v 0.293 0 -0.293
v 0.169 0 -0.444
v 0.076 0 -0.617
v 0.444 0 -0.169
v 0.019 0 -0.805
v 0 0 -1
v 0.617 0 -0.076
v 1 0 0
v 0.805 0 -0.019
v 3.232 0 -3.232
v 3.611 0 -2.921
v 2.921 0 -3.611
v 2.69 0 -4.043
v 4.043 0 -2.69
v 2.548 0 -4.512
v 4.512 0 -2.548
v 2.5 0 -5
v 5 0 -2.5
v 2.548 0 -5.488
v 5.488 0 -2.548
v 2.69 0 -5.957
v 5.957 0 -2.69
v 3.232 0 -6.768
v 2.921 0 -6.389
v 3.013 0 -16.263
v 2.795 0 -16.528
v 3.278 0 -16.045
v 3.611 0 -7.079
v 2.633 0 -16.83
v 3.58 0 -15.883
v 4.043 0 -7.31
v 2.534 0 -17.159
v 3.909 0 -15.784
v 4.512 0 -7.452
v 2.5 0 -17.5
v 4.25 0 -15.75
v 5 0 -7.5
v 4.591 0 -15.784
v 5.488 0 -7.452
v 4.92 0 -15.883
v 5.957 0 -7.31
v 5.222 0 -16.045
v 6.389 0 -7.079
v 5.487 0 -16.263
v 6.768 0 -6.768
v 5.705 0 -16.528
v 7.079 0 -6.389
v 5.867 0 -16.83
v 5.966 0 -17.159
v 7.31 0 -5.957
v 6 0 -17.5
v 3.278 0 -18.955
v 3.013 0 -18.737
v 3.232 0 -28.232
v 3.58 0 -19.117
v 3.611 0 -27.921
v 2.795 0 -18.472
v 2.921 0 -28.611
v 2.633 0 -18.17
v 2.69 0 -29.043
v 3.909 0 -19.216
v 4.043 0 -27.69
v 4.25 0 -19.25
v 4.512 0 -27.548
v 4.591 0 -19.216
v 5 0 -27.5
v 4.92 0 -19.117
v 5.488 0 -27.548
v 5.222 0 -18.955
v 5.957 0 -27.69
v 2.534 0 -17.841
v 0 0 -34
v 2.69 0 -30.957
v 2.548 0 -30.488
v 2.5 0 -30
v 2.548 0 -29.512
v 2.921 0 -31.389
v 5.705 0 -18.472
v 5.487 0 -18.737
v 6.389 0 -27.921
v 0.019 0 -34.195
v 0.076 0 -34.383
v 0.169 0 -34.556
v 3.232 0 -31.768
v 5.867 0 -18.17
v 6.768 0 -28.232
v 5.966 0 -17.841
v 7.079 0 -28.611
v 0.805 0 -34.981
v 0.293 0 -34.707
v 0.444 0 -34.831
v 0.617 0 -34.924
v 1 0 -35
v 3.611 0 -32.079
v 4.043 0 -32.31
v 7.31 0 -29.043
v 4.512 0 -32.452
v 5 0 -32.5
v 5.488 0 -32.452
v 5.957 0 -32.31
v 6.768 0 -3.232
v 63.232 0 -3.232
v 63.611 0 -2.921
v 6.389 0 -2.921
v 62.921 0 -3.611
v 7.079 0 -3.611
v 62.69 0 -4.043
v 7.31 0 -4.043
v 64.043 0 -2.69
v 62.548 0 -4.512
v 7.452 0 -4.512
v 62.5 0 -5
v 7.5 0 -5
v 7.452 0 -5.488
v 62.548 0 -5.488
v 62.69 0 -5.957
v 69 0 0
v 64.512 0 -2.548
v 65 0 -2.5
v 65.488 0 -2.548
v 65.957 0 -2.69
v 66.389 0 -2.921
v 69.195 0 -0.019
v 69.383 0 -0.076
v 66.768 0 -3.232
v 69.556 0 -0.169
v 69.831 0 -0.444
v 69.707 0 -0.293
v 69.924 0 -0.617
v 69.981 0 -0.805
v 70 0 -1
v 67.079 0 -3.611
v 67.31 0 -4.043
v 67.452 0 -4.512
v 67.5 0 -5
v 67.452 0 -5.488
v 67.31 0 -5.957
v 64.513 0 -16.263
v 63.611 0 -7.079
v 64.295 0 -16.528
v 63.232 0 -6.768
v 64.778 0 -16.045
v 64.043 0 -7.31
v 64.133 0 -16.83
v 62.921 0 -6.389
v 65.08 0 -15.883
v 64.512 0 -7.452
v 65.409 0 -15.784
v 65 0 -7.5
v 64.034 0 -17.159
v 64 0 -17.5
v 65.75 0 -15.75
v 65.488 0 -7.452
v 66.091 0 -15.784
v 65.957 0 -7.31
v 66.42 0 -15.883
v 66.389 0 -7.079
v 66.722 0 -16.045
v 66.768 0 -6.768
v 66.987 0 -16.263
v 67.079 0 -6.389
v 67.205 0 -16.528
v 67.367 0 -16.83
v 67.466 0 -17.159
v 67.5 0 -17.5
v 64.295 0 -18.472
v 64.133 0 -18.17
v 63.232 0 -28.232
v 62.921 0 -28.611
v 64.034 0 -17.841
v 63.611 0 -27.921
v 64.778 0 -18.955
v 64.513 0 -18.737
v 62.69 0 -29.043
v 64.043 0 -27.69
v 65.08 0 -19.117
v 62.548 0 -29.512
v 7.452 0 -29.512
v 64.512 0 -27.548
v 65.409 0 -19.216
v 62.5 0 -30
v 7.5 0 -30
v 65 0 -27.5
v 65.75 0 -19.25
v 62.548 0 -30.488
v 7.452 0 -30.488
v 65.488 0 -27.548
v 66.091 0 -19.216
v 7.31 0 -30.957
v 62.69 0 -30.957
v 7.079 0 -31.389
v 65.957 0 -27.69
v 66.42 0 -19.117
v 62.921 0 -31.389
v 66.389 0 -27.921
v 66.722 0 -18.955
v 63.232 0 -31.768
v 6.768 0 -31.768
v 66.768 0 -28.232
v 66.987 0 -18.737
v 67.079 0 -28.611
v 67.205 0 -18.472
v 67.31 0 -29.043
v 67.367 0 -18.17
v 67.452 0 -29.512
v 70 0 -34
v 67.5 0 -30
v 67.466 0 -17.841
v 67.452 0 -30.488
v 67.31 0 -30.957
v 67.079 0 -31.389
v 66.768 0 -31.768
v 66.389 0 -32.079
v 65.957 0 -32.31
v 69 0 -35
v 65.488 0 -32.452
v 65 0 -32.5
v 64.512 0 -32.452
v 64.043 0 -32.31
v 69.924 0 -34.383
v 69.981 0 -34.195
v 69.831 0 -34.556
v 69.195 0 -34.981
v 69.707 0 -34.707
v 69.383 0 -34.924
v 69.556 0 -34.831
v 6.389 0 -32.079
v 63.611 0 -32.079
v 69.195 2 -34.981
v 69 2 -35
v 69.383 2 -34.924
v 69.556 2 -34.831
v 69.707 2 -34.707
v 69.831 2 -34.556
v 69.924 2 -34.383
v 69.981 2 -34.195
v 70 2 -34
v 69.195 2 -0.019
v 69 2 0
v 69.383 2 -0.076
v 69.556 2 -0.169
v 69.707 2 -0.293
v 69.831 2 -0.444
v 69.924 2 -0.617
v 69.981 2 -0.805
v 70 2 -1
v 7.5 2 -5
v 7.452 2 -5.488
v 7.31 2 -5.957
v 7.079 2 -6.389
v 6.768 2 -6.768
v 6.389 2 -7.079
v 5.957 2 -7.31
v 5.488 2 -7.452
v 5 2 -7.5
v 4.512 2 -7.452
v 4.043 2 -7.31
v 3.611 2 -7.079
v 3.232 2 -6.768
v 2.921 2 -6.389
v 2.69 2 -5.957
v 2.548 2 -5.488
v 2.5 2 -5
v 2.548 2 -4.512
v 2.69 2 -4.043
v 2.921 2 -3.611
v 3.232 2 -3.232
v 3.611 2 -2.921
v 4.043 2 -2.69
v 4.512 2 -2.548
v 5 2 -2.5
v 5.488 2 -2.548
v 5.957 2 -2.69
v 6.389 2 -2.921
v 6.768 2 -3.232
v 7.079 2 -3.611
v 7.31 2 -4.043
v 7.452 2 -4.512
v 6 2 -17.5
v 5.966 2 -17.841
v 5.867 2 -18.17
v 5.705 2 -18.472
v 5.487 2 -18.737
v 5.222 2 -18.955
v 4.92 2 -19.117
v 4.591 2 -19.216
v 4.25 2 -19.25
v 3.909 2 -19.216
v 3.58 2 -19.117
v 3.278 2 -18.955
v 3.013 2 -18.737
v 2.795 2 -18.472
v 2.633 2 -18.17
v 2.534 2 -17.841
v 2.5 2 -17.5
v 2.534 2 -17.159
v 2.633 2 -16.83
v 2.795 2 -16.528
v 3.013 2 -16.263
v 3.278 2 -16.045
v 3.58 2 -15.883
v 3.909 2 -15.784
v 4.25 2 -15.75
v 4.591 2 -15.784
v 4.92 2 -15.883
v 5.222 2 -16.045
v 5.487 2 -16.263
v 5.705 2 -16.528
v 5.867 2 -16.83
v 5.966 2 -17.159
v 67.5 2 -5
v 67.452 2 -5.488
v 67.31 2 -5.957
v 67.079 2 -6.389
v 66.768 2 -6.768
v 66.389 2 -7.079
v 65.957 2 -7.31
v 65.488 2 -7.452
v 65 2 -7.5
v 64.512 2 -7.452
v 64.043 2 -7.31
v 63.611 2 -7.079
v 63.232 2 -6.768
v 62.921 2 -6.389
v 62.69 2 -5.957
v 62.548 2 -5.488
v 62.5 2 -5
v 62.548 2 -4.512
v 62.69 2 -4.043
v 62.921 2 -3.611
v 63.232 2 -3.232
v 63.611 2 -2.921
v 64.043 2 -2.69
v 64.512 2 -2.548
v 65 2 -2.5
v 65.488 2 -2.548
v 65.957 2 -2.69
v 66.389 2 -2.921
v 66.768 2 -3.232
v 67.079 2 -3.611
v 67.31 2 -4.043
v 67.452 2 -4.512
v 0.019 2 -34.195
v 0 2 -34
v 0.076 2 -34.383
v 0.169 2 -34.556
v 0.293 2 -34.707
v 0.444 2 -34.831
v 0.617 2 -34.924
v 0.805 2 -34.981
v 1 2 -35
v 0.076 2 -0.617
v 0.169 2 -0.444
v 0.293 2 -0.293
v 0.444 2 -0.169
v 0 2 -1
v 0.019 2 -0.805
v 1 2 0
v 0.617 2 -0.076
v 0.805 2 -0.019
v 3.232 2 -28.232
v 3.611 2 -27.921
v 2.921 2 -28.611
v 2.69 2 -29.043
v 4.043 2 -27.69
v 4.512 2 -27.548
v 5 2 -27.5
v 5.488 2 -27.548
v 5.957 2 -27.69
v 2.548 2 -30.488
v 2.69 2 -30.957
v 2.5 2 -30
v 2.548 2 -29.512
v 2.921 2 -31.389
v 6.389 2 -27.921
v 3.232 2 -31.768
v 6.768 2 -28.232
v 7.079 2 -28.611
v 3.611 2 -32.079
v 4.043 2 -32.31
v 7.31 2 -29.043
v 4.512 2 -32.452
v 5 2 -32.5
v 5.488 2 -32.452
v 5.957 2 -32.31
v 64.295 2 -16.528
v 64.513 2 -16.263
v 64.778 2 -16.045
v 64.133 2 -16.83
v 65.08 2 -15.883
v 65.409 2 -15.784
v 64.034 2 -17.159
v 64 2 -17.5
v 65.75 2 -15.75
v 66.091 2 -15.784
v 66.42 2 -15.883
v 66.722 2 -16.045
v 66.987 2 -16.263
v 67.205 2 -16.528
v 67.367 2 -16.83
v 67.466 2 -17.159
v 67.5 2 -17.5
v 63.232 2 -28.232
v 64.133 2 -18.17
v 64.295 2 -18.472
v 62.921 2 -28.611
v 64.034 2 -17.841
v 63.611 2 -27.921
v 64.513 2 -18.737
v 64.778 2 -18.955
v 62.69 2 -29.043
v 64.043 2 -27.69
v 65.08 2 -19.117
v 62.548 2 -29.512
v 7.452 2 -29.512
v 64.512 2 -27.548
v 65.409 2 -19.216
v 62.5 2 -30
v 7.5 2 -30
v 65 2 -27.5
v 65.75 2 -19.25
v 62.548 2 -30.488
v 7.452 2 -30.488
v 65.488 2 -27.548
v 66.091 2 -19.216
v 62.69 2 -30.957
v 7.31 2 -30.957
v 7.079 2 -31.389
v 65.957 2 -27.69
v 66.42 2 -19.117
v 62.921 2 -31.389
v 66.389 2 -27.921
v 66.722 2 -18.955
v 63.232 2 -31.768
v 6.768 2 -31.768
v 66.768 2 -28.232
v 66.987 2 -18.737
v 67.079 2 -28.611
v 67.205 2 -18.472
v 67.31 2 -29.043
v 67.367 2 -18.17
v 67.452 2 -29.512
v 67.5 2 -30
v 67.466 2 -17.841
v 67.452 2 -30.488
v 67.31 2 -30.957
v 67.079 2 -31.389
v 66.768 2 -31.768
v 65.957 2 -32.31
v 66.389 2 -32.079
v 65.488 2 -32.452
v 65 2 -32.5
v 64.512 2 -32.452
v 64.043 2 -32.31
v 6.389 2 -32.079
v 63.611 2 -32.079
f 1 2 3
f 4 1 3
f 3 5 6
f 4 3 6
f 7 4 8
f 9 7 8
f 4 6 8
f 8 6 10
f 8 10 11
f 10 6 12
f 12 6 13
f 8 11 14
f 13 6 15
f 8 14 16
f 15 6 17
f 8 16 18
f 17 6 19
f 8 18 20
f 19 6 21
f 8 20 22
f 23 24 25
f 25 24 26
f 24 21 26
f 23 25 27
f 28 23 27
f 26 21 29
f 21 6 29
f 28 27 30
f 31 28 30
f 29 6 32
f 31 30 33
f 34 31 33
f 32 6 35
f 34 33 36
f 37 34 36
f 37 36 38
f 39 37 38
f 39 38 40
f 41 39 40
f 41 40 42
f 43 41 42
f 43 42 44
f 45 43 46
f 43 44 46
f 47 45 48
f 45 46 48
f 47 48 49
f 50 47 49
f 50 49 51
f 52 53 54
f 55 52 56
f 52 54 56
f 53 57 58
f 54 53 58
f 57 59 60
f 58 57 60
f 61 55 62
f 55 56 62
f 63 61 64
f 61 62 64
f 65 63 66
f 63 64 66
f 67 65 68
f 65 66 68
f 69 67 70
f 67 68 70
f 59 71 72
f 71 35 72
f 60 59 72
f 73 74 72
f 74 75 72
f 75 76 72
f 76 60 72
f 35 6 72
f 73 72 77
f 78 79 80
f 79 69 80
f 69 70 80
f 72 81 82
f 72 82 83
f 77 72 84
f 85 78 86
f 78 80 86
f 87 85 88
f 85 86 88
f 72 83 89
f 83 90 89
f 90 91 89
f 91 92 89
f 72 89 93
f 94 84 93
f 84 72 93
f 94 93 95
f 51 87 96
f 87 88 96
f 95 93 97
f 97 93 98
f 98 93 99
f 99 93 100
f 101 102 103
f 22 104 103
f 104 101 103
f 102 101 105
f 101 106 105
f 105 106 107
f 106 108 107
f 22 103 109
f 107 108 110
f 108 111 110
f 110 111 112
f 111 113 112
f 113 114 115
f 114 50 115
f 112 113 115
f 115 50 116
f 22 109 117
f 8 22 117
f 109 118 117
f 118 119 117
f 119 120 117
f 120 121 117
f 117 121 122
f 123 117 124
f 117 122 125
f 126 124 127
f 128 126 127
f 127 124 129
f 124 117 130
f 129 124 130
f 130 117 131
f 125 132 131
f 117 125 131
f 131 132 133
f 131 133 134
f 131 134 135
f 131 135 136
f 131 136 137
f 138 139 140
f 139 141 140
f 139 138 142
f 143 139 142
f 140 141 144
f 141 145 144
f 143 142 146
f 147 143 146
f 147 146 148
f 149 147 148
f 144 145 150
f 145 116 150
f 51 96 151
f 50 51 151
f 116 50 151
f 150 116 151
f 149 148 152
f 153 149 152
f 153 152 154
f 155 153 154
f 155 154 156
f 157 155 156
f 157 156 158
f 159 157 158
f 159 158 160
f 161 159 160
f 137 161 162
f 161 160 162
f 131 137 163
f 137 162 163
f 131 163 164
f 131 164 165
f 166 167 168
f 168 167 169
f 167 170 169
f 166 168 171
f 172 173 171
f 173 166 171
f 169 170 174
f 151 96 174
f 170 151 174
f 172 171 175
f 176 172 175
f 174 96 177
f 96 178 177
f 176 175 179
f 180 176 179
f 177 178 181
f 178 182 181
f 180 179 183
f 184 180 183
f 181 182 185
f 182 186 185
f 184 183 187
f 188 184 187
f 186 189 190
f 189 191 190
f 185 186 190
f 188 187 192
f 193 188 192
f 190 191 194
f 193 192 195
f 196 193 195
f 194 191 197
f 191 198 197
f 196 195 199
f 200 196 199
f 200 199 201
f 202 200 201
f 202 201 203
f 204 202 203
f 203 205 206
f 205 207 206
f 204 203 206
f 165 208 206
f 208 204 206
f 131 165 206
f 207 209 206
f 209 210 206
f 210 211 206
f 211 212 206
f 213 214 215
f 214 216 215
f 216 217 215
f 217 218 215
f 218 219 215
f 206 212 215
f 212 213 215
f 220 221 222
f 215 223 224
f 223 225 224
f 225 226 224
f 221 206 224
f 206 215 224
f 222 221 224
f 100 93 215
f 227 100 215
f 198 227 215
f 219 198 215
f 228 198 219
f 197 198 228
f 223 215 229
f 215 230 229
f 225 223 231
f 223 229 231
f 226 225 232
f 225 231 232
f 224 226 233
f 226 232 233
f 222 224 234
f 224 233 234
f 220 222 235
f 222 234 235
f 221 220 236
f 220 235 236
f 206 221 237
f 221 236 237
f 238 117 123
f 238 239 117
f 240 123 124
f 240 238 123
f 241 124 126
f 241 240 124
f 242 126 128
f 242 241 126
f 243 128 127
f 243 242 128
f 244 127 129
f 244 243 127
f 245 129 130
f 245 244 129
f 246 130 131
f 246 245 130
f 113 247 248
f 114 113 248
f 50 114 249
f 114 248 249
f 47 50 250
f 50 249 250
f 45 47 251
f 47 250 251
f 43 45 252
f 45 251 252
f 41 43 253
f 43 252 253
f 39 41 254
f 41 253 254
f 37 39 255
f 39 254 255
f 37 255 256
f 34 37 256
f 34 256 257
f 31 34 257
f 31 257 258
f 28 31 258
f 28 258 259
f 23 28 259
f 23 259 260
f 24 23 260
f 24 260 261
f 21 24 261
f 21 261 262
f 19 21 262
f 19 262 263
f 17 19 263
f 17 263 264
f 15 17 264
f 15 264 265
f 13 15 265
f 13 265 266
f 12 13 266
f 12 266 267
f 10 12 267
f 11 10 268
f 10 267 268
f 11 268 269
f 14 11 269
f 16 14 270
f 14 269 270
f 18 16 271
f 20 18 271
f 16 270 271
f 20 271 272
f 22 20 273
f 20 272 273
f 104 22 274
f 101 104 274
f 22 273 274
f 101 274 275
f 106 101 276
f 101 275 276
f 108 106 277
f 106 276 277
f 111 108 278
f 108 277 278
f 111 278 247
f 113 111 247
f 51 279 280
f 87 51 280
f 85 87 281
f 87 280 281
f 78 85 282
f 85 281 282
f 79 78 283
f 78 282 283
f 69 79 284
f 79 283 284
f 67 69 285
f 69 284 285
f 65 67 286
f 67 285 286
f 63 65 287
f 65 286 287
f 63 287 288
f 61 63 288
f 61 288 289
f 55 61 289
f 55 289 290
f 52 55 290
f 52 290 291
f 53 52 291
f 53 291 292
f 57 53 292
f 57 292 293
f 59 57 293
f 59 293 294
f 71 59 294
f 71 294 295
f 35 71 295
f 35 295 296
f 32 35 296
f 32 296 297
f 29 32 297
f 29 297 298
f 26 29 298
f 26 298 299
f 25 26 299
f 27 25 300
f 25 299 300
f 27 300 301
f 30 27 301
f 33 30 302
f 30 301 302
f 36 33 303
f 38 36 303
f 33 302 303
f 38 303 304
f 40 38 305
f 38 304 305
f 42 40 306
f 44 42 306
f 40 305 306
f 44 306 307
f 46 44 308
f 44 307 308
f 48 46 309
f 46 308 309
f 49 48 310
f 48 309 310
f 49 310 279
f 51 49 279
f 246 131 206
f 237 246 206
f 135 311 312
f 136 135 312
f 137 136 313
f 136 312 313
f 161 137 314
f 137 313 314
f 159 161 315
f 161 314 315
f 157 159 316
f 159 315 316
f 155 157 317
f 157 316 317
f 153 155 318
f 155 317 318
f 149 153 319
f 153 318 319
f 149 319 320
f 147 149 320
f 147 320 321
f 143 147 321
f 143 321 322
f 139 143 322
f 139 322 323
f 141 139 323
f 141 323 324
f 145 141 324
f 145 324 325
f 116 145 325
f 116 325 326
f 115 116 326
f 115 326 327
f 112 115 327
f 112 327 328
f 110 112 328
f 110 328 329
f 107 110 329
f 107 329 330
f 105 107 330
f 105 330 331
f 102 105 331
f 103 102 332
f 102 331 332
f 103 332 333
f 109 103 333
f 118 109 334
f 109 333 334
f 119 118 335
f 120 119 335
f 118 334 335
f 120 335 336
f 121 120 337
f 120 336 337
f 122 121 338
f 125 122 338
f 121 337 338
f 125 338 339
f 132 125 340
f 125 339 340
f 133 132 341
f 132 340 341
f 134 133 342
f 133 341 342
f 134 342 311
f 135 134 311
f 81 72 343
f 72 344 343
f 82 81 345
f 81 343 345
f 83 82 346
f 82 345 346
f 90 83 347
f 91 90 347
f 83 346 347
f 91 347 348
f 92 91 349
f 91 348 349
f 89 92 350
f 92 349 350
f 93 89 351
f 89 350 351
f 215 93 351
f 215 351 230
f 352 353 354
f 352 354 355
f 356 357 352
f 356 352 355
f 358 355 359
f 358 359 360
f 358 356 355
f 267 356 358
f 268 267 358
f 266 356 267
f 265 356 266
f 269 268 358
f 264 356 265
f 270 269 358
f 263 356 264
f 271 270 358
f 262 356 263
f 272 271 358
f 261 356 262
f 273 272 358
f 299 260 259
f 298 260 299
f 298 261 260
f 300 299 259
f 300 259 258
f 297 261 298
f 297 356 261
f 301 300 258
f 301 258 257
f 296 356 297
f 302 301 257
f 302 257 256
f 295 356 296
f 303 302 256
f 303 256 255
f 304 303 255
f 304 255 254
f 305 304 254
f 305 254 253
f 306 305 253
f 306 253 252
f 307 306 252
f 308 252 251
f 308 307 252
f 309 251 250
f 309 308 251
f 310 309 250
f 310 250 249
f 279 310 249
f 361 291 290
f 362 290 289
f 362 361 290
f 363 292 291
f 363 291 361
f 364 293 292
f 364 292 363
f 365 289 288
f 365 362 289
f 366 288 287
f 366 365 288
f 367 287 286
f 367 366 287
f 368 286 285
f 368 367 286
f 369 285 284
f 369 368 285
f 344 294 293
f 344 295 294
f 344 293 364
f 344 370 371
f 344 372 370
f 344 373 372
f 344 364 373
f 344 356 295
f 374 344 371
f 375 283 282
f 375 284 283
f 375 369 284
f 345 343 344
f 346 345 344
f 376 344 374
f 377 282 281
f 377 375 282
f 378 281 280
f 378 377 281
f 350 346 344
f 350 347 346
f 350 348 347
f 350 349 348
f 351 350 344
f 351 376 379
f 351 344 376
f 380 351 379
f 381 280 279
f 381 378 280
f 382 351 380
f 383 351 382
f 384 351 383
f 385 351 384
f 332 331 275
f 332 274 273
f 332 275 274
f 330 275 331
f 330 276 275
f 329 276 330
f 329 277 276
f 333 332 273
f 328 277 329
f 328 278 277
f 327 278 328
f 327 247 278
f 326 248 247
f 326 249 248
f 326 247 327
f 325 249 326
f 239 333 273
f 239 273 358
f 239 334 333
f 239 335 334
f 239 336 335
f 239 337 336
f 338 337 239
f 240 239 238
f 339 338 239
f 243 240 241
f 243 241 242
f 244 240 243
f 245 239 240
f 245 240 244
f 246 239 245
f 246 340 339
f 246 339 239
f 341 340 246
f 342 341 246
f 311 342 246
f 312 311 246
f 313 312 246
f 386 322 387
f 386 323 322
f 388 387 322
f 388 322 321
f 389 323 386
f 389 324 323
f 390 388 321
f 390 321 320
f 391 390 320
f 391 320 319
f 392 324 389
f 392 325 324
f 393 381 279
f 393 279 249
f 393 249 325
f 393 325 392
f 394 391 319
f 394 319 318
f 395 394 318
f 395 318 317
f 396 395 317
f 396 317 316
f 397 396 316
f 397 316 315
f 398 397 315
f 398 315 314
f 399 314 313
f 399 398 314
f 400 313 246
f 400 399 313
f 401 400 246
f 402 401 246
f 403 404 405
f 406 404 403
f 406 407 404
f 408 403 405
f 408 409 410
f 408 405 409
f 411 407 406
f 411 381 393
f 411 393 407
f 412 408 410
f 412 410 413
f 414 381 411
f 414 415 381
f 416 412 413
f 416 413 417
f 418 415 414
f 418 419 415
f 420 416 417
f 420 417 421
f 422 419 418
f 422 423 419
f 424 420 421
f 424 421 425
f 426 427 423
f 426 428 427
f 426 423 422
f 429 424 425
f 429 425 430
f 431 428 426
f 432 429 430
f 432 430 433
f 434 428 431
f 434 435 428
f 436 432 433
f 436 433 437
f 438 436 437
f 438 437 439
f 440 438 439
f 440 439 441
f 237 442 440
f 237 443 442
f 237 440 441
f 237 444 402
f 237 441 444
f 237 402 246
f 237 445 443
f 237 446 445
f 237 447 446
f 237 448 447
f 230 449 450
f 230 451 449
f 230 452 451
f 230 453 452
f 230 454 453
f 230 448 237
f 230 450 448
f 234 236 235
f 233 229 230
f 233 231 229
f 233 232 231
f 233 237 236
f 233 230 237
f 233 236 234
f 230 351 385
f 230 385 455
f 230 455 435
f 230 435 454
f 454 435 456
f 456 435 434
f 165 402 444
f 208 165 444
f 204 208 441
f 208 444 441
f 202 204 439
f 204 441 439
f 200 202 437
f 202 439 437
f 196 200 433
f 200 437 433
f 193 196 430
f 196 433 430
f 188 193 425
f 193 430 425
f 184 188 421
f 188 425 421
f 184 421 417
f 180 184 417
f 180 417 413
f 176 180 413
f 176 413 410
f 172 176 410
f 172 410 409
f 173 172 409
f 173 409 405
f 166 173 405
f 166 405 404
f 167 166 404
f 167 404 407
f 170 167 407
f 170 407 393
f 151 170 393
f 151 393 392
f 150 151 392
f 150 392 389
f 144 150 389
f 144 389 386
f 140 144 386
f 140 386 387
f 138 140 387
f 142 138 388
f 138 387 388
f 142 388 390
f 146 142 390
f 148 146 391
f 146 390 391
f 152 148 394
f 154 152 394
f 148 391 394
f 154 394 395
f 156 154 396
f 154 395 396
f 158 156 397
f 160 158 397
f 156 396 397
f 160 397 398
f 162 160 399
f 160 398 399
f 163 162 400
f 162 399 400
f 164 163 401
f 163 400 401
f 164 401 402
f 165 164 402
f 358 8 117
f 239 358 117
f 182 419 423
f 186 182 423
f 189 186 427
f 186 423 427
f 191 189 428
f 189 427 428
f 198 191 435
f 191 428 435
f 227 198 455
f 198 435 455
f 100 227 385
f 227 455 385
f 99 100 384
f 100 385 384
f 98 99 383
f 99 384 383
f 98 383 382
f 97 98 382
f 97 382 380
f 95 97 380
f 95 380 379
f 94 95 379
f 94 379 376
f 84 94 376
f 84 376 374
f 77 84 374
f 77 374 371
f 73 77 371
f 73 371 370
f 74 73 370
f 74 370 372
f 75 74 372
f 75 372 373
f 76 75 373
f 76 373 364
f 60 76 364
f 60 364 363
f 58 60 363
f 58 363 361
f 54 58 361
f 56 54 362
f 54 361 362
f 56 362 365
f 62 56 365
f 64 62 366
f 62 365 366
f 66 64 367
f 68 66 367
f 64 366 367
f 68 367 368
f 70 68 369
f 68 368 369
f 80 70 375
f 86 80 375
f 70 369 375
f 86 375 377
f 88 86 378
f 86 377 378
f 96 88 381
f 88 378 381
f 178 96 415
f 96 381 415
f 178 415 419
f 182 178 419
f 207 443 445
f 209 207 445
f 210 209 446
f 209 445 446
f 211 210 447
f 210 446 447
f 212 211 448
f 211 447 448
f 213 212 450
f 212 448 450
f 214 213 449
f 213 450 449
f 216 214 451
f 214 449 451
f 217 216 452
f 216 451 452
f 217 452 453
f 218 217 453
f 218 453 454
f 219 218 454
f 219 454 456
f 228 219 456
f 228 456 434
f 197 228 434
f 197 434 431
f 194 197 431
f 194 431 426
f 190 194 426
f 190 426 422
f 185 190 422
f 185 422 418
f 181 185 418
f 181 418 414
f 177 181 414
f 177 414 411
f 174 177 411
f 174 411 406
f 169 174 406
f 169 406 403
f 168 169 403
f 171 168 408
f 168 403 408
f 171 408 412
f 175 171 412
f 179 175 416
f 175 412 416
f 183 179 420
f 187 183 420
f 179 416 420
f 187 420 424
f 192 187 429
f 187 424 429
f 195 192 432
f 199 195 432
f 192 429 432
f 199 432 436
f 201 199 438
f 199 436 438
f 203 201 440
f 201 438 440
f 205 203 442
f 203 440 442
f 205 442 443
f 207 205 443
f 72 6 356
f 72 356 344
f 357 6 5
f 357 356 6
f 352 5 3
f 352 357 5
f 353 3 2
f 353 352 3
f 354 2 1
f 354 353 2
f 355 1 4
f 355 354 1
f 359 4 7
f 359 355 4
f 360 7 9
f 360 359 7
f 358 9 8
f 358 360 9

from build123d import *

# Parameters (mm, degrees)
SKETCH1_W               = 70
SKETCH1_H               = 35
BOSS_EXTRUDE1_DEPTH     = 2
SKETCH2_R               = 2.5
SKETCH2_R_2             = 1.75
CUT_EXTRUDE1_DEPTH      = 1
CUT_EXTRUDE1_DEPTH_BACK = 3
FILLET1_R               = 1


with BuildPart() as part:
    # Sketch1 → Boss-Extrude1 (new body)
    with BuildSketch(Plane(origin=(0, 0, 0), x_dir=(1, 0, 0), z_dir=(0, 1, 0))):
        with Locations((35, 17.5)):
            Rectangle(SKETCH1_W, SKETCH1_H)
    extrude(amount=BOSS_EXTRUDE1_DEPTH)

    # Sketch2 → Cut-Extrude1 (cut, two sides)
    with BuildSketch(Plane(origin=(0, 2, 0), x_dir=(1, 0, 0), z_dir=(0, 1, 0))) as cut_extrude1_sk:
        with Locations((5, 30)):
            Circle(SKETCH2_R)
        with Locations((5, 5)):
            Circle(SKETCH2_R)
        with Locations((4.25, 17.5)):
            Circle(SKETCH2_R_2)
        with Locations((65.75, 17.5)):
            Circle(SKETCH2_R_2)
        with Locations((65, 5)):
            Circle(SKETCH2_R)
        with Locations((65, 30)):
            Circle(SKETCH2_R)
    extrude(amount=CUT_EXTRUDE1_DEPTH, mode=Mode.SUBTRACT)
    extrude(cut_extrude1_sk.sketch, amount=-CUT_EXTRUDE1_DEPTH_BACK, mode=Mode.SUBTRACT)

    # Fillet1
    fillet1_edges = [part.edges().sort_by_distance(p)[0] for p in [
        (0, 1, -35),
        (70, 1, -35),
        (70, 1, 0),
        (0, 1, 0),
    ]]
    fillet(fillet1_edges, radius=FILLET1_R)


solid = part.part
